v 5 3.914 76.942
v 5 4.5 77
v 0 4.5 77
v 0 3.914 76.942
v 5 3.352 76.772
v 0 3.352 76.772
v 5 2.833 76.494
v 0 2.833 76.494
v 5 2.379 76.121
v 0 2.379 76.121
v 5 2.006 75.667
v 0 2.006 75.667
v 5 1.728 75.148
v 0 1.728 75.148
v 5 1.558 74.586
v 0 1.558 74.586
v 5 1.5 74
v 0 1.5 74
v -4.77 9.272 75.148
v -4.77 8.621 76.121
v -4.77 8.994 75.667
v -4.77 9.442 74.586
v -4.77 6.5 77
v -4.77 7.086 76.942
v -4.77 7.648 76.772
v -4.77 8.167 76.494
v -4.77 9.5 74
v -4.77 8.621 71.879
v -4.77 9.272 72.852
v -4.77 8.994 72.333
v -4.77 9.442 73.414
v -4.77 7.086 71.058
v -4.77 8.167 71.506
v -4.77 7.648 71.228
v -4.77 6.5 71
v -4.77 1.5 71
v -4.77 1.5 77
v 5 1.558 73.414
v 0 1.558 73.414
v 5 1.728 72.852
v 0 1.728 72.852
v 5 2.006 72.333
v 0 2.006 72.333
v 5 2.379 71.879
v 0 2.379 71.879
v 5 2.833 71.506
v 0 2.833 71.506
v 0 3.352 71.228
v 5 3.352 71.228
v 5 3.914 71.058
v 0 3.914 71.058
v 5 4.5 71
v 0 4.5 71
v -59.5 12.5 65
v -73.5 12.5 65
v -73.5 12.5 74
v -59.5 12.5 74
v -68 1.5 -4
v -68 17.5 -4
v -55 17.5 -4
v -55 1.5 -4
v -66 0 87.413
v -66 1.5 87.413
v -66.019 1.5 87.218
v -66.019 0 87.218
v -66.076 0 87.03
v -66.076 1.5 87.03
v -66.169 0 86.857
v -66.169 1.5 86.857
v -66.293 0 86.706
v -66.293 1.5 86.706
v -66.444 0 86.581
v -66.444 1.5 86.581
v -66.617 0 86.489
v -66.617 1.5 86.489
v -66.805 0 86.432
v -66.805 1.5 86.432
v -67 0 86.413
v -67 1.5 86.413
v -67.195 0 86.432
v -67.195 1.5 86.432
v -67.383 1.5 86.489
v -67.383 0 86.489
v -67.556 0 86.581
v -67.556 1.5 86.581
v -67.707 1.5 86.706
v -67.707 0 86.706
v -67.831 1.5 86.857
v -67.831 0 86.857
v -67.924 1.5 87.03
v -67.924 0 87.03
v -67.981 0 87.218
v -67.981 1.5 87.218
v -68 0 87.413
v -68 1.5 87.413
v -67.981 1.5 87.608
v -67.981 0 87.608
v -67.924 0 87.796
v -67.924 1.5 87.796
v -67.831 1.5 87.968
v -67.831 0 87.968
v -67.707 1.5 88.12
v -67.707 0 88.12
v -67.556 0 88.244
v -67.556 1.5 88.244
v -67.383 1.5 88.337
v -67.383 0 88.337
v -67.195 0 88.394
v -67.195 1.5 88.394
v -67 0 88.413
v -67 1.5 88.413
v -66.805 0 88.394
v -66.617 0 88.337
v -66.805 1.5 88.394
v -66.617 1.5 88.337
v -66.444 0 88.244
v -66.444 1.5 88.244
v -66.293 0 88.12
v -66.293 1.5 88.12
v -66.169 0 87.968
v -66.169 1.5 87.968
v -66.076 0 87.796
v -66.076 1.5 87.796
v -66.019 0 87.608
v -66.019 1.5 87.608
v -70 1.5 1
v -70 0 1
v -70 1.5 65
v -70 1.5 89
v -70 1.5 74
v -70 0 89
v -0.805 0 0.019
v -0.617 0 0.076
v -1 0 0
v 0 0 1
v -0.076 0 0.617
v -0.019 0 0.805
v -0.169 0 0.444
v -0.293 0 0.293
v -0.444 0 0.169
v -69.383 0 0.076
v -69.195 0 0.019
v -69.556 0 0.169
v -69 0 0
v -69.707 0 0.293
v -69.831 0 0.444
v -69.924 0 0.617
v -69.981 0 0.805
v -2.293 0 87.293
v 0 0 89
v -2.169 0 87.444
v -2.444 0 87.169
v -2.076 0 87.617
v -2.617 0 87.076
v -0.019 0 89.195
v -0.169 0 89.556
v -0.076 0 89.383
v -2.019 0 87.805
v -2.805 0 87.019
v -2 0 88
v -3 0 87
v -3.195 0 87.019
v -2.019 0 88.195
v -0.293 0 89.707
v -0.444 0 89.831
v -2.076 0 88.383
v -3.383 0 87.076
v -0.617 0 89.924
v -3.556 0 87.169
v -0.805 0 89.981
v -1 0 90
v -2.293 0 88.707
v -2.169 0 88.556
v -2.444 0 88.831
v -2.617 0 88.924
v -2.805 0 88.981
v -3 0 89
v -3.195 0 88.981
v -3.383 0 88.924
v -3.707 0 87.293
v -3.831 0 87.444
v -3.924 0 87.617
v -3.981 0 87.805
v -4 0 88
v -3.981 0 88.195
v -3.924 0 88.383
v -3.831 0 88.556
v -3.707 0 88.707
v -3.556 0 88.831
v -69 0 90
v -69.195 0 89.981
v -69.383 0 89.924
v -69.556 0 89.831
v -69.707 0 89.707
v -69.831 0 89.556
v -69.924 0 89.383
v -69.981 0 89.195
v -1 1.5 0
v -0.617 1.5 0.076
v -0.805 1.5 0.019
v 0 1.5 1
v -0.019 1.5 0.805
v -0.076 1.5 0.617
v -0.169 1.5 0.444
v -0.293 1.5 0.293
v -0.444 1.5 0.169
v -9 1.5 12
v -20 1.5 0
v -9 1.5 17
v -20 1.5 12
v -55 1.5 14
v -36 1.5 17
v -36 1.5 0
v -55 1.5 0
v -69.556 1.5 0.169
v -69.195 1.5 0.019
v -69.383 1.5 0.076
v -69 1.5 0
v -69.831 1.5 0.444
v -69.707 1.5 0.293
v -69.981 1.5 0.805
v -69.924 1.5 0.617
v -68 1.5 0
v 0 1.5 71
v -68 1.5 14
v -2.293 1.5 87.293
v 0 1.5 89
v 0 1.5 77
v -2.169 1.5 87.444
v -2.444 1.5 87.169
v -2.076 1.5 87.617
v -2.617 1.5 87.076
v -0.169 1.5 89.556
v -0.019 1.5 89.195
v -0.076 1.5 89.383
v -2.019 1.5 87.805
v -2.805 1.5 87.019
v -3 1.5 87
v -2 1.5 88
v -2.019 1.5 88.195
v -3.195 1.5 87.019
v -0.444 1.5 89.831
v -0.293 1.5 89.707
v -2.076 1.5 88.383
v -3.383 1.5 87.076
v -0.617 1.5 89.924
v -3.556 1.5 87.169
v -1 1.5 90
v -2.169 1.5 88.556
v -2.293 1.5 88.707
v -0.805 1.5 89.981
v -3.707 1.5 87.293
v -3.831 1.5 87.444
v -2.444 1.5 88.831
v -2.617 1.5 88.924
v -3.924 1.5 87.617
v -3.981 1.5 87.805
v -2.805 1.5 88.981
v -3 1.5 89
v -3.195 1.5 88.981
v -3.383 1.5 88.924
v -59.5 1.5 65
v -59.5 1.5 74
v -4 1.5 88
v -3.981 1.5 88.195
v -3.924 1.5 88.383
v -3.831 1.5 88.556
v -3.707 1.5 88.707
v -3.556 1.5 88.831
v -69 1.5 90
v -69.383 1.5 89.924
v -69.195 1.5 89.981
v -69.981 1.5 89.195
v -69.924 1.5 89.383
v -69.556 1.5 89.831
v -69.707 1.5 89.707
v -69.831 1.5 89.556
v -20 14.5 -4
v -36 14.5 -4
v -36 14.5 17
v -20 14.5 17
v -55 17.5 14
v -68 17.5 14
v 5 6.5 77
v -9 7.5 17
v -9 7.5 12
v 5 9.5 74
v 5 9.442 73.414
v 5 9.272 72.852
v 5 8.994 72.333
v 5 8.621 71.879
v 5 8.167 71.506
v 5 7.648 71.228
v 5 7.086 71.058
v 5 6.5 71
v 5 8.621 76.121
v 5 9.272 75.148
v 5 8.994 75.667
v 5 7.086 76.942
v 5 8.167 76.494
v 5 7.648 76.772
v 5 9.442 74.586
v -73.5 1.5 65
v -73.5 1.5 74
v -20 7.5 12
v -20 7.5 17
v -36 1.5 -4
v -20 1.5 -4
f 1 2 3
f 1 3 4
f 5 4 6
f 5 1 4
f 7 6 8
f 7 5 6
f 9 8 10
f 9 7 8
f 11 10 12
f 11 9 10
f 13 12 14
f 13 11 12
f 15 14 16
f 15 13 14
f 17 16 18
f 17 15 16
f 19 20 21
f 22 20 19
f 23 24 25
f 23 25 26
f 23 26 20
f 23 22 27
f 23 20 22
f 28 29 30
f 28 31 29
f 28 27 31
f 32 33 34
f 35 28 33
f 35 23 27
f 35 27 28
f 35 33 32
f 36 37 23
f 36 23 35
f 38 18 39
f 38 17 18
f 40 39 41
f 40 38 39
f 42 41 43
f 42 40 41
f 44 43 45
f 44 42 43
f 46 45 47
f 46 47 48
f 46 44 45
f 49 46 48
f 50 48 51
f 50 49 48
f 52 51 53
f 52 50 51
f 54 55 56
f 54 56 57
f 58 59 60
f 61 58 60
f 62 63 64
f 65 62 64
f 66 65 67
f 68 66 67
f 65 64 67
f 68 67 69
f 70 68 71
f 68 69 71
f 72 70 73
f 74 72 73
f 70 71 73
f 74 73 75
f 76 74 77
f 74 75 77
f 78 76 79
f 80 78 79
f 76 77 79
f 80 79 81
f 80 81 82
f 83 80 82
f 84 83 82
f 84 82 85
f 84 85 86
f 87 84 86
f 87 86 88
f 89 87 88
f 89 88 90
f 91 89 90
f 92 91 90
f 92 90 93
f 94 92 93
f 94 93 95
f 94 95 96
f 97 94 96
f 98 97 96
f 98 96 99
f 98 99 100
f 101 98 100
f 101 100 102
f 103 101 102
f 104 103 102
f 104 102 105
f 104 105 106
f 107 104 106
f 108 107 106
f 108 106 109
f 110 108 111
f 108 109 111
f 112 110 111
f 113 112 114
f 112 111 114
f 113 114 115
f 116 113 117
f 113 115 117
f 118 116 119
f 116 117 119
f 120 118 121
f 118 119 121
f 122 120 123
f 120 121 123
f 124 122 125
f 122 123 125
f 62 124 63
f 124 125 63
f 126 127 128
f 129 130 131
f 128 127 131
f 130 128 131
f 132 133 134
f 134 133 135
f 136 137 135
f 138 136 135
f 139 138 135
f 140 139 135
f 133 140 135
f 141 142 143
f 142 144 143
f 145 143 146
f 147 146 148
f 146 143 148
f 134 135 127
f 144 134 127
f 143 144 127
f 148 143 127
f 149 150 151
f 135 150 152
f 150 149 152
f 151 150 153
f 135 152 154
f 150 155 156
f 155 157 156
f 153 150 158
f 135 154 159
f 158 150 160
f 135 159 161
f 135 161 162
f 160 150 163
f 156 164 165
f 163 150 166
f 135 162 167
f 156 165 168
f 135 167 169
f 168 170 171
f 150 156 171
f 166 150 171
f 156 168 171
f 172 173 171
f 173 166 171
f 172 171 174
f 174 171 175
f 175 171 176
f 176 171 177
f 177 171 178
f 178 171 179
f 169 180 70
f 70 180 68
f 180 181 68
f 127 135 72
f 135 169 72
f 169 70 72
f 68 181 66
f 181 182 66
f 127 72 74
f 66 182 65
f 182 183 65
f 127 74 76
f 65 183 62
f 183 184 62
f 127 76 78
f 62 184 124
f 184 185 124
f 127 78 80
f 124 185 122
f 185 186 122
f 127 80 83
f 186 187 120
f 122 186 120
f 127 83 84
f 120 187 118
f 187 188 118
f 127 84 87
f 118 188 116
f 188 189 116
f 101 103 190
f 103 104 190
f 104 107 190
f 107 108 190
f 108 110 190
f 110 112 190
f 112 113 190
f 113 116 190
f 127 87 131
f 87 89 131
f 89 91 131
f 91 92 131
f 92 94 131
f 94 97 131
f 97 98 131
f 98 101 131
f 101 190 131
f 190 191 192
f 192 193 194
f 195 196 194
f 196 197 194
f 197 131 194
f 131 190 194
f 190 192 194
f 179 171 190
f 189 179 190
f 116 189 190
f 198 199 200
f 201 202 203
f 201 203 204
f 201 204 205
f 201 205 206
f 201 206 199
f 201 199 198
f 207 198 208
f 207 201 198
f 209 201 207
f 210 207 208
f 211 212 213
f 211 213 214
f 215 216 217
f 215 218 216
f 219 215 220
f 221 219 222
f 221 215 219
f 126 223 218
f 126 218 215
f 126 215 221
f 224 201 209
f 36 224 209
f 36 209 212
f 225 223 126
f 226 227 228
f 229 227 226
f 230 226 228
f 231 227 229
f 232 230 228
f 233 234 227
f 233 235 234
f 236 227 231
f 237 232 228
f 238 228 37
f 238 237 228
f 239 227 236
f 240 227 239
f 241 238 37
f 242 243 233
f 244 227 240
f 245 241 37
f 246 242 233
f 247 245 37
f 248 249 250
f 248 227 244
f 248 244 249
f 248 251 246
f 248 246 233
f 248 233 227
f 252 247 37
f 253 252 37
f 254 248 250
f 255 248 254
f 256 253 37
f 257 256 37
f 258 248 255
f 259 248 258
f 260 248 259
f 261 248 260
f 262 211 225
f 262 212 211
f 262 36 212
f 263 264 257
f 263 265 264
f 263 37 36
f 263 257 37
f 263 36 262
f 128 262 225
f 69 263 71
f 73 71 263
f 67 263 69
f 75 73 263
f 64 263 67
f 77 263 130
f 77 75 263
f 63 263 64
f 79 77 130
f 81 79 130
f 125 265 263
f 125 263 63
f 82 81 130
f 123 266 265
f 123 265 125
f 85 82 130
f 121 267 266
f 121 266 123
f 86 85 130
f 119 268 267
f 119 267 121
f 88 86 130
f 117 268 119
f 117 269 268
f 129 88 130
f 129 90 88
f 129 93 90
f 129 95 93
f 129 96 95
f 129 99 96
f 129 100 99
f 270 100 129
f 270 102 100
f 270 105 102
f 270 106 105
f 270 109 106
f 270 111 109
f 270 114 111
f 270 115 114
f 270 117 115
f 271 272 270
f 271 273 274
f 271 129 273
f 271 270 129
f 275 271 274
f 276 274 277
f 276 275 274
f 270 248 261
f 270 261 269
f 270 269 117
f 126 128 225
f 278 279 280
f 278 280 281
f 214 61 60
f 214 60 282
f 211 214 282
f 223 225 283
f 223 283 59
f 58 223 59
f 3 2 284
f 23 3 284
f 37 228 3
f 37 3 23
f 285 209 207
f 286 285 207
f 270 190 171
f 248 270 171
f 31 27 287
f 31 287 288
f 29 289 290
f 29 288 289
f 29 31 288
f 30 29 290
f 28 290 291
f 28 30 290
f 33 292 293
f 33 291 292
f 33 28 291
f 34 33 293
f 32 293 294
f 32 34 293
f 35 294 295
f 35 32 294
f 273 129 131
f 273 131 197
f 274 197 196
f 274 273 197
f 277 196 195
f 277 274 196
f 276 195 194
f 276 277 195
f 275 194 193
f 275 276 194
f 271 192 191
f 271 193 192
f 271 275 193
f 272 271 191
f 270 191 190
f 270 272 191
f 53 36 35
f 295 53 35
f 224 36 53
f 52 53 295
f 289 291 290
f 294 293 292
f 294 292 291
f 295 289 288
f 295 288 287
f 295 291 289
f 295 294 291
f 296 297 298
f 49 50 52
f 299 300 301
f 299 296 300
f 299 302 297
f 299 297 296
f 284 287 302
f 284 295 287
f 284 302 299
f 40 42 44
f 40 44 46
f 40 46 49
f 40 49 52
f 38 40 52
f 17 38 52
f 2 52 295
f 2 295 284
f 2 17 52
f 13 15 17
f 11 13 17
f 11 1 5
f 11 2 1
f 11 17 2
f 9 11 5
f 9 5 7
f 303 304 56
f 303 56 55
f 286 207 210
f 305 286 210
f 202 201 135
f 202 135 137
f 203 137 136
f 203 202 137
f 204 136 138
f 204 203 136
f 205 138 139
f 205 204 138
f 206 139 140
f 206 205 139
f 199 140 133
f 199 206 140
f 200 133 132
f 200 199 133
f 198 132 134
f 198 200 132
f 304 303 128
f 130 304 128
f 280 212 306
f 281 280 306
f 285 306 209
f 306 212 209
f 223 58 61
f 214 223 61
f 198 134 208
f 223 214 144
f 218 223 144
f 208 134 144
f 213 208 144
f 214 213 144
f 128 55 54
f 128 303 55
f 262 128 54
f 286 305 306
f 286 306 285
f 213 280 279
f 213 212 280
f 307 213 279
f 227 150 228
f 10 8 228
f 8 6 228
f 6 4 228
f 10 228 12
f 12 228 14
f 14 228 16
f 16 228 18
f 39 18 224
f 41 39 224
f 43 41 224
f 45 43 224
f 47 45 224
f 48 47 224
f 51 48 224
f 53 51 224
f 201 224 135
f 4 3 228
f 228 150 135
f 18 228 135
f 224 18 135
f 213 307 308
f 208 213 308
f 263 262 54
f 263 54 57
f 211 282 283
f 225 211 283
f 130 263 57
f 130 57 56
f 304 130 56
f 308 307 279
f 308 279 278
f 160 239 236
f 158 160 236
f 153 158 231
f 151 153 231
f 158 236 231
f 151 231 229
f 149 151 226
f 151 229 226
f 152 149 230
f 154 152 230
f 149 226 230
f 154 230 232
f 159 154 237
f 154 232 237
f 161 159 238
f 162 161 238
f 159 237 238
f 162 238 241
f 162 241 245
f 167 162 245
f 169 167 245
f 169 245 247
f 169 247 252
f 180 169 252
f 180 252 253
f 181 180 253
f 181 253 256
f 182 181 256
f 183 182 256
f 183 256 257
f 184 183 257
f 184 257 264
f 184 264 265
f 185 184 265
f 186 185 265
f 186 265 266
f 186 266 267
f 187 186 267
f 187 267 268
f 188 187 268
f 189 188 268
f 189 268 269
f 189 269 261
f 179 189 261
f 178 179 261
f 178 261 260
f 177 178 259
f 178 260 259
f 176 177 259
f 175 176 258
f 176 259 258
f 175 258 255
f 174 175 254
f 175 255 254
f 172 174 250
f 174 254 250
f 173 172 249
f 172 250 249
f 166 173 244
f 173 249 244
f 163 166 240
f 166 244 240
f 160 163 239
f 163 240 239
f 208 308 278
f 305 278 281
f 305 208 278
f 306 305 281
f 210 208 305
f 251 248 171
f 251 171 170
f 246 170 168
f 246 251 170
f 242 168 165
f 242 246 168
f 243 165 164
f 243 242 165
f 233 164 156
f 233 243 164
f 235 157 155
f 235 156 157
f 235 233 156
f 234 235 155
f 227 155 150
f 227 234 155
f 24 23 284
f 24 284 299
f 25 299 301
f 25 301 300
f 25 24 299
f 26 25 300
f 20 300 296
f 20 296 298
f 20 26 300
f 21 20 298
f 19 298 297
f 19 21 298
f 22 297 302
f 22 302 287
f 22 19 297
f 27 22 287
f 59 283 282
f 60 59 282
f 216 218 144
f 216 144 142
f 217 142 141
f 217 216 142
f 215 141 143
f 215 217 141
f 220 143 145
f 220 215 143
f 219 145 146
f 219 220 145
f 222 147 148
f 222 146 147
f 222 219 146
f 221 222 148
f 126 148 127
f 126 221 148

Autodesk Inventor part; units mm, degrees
ref_plane "YZ Plane" through (0, 0, 0) normal (1, 0, 0) x (0, 1, 0)
ref_plane "XZ Plane" through (0, 0, 0) normal (0, 1, 0) x (-1, 0, 0)
ref_plane "XY Plane" through (0, 0, 0) normal (0, 0, 1) x (1, 0, 0)
sketch "Эскиз1" plane through (0, 0, 0) normal (0, 1, 0) x (-1, 0, 0)
  line L0 (0, 0) -> (70, 0)
  line L1 (70, 0) -> (70, 90)
  line L2 (70, 90) -> (0, 90)
  line L3 (0, 90) -> (0, 0)
  dimension "d0" = 70
  dimension "d1" = 90
extrude "Выдавливание1" add sketch "Эскиз1" along normal blind 1.5
fillet "Сопряжение1" radius 1 4 edges at (0, 0.75, 90) (0, 0.75, 0) (-70, 0.75, 90) (-70, 0.75, 0)
sketch "Эскиз2" plane through (0, 1.5, 0) normal (0, 1, 0) x (1, 0, 0)
  line L0 (-59.5, -74) -> (-73.5, -74)
  line L1 (-73.5, -74) -> (-73.5, -65)
  line L2 (-73.5, -65) -> (-59.5, -65)
  line L3 (-59.5, -65) -> (-59.5, -74)
  line L4 (-69, -90) -> (-1, -90) projected
  line L5 (-70, -1) -> (-70, -89) projected
  point P0 (0, 0)
  dimension "d5" = 16
  dimension "d6" = 9
  dimension "d7" = 14
  dimension "d8" = 3.5
extrude "Выдавливание2" add sketch "Эскиз2" along normal blind 11
sketch "Эскиз3" plane through (0, 1.5, 0) normal (0, 1, 0) x (1, 0, 0)
  line L0 (5, -77) -> (-4.77, -77)
  line L1 (-4.77, -77) -> (-4.77, -71)
  line L2 (-4.77, -71) -> (5, -71)
  line L3 (5, -71) -> (5, -77)
  line L4 (-69, -90) -> (-1, -90) projected
  line L5 (0, -89) -> (0, -1) projected
  point P0 (0, 0)
  dimension "d11" = 6
  dimension "d12" = 13
  dimension "d13" = 5
extrude "Выдавливание3" add sketch "Эскиз3" along normal blind 8
fillet "Сопряжение2" radius 3 4 edges at (0.115, 9.5, 71) (0.115, 9.5, 77) (2.5, 1.5, 77) (2.5, 1.5, 71)
sketch "Эскиз4" plane through (0, 1.5, 0) normal (0, 1, 0) x (1, 0, 0)
  line L0 (-20, -17) -> (-36, -17)
  line L1 (-36, -17) -> (-36, 4)
  line L2 (-36, 4) -> (-20, 4)
  line L3 (-20, 4) -> (-20, -17)
  line L4 (-1, 0) -> (-69, 0) projected
  line L5 (0, -71) -> (0, -1) projected
  point P0 (0, 0)
  dimension "d17" = 21
  dimension "d18" = 16
  dimension "d19" = 4
  dimension "d20" = 20
extrude "Выдавливание4" add sketch "Эскиз4" along normal blind 13
sketch "Эскиз5" plane through (0, 1.5, 0) normal (0, 1, 0) x (1, 0, 0)
  line L0 (-55, -14) -> (-68, -14)
  line L1 (-68, -14) -> (-68, 4)
  line L2 (-68, 4) -> (-55, 4)
  line L3 (-55, 4) -> (-55, -14)
  line L4 (-70, -1) -> (-70, -65) projected
  line L5 (-36, 0) -> (-69, 0) projected
  point P0 (0, 0)
  dimension "d27" = 16
  dimension "d23" = 18
  dimension "d24" = 13
  dimension "d25" = 2
  dimension "d26" = 4
extrude "Выдавливание5" add sketch "Эскиз5" along normal blind 16
sketch "Эскиз6" plane through (0, 1.5, 0) normal (0, 1, 0) x (1, 0, 0)
  arc A0 (-1, -90) -> (0, -89) centre (-1, -89) ccw projected
  arc A1 (-70, -89) -> (-69, -90) centre (-69, -89) ccw projected
  circle A2 centre (-67, -87.4129) radius 1
  line L0 (-68, -14) -> (-68, 0) projected
  line L1 (-68, 0) -> (-69, 0) projected
  arc A3 (-69, 0) -> (-70, -1) centre (-69, -1) ccw projected
  line L2 (-70, -1) -> (-70, -65) projected
  line L3 (-70, -65) -> (-59.5, -65) projected
  line L4 (-59.5, -65) -> (-59.5, -74) projected
  line L5 (-59.5, -74) -> (-70, -74) projected
  line L6 (-70, -74) -> (-70, -89) projected
  arc A4 (-70, -89) -> (-69, -90) centre (-69, -89) ccw projected
  line L7 (-69, -90) -> (-1, -90) projected
  arc A5 (-1, -90) -> (0, -89) centre (-1, -89) ccw projected
  line L8 (0, -89) -> (0, -77) projected
  line L9 (0, -77) -> (-4.77, -77) projected
  line L10 (-4.77, -77) -> (-4.77, -71) projected
  line L11 (-4.77, -71) -> (0, -71) projected
  line L12 (0, -71) -> (0, -1) projected
  arc A6 (0, -1) -> (-1, 0) centre (-1, -1) ccw projected
  line L13 (-1, 0) -> (-20, 0) projected
  line L14 (-20, 0) -> (-20, -17) projected
  line L15 (-20, -17) -> (-36, -17) projected
  line L16 (-36, -17) -> (-36, 0) projected
  line L17 (-36, 0) -> (-55, 0) projected
  line L18 (-55, 0) -> (-55, -14) projected
  line L19 (-55, -14) -> (-68, -14) projected
  circle A7 centre (-3, -88) radius 1
  point P0 (0, 0)
  dimension "d29" = 2
  dimension "d30" = 2
  dimension "d31" = 64
  dimension "d32" = 70
  dimension "d33" = 3
extrude "Выдавливание6" cut sketch "Эскиз6" against normal blind 3 contours A2 | A7
sketch "Эскиз7" plane through (0, 1.5, 0) normal (0, 1, 0) x (1, 0, 0)
  line L0 (-36, -17) -> (-20, -17) projected
  line L1 (-20, 0) -> (-20, -17) projected
  line L2 (-20, -17) -> (-9, -17)
  line L3 (-9, -17) -> (-9, -12)
  line L4 (-9, -12) -> (-20, -12)
  line L5 (-20, -12) -> (-20, -17)
  point P0 (0, 0)
  dimension "d36" = 11
  dimension "d37" = 5
extrude "Выдавливание7" add sketch "Эскиз7" along normal blind 6
equation "\"d34\" = d33"
properties part number "Stemboard"
